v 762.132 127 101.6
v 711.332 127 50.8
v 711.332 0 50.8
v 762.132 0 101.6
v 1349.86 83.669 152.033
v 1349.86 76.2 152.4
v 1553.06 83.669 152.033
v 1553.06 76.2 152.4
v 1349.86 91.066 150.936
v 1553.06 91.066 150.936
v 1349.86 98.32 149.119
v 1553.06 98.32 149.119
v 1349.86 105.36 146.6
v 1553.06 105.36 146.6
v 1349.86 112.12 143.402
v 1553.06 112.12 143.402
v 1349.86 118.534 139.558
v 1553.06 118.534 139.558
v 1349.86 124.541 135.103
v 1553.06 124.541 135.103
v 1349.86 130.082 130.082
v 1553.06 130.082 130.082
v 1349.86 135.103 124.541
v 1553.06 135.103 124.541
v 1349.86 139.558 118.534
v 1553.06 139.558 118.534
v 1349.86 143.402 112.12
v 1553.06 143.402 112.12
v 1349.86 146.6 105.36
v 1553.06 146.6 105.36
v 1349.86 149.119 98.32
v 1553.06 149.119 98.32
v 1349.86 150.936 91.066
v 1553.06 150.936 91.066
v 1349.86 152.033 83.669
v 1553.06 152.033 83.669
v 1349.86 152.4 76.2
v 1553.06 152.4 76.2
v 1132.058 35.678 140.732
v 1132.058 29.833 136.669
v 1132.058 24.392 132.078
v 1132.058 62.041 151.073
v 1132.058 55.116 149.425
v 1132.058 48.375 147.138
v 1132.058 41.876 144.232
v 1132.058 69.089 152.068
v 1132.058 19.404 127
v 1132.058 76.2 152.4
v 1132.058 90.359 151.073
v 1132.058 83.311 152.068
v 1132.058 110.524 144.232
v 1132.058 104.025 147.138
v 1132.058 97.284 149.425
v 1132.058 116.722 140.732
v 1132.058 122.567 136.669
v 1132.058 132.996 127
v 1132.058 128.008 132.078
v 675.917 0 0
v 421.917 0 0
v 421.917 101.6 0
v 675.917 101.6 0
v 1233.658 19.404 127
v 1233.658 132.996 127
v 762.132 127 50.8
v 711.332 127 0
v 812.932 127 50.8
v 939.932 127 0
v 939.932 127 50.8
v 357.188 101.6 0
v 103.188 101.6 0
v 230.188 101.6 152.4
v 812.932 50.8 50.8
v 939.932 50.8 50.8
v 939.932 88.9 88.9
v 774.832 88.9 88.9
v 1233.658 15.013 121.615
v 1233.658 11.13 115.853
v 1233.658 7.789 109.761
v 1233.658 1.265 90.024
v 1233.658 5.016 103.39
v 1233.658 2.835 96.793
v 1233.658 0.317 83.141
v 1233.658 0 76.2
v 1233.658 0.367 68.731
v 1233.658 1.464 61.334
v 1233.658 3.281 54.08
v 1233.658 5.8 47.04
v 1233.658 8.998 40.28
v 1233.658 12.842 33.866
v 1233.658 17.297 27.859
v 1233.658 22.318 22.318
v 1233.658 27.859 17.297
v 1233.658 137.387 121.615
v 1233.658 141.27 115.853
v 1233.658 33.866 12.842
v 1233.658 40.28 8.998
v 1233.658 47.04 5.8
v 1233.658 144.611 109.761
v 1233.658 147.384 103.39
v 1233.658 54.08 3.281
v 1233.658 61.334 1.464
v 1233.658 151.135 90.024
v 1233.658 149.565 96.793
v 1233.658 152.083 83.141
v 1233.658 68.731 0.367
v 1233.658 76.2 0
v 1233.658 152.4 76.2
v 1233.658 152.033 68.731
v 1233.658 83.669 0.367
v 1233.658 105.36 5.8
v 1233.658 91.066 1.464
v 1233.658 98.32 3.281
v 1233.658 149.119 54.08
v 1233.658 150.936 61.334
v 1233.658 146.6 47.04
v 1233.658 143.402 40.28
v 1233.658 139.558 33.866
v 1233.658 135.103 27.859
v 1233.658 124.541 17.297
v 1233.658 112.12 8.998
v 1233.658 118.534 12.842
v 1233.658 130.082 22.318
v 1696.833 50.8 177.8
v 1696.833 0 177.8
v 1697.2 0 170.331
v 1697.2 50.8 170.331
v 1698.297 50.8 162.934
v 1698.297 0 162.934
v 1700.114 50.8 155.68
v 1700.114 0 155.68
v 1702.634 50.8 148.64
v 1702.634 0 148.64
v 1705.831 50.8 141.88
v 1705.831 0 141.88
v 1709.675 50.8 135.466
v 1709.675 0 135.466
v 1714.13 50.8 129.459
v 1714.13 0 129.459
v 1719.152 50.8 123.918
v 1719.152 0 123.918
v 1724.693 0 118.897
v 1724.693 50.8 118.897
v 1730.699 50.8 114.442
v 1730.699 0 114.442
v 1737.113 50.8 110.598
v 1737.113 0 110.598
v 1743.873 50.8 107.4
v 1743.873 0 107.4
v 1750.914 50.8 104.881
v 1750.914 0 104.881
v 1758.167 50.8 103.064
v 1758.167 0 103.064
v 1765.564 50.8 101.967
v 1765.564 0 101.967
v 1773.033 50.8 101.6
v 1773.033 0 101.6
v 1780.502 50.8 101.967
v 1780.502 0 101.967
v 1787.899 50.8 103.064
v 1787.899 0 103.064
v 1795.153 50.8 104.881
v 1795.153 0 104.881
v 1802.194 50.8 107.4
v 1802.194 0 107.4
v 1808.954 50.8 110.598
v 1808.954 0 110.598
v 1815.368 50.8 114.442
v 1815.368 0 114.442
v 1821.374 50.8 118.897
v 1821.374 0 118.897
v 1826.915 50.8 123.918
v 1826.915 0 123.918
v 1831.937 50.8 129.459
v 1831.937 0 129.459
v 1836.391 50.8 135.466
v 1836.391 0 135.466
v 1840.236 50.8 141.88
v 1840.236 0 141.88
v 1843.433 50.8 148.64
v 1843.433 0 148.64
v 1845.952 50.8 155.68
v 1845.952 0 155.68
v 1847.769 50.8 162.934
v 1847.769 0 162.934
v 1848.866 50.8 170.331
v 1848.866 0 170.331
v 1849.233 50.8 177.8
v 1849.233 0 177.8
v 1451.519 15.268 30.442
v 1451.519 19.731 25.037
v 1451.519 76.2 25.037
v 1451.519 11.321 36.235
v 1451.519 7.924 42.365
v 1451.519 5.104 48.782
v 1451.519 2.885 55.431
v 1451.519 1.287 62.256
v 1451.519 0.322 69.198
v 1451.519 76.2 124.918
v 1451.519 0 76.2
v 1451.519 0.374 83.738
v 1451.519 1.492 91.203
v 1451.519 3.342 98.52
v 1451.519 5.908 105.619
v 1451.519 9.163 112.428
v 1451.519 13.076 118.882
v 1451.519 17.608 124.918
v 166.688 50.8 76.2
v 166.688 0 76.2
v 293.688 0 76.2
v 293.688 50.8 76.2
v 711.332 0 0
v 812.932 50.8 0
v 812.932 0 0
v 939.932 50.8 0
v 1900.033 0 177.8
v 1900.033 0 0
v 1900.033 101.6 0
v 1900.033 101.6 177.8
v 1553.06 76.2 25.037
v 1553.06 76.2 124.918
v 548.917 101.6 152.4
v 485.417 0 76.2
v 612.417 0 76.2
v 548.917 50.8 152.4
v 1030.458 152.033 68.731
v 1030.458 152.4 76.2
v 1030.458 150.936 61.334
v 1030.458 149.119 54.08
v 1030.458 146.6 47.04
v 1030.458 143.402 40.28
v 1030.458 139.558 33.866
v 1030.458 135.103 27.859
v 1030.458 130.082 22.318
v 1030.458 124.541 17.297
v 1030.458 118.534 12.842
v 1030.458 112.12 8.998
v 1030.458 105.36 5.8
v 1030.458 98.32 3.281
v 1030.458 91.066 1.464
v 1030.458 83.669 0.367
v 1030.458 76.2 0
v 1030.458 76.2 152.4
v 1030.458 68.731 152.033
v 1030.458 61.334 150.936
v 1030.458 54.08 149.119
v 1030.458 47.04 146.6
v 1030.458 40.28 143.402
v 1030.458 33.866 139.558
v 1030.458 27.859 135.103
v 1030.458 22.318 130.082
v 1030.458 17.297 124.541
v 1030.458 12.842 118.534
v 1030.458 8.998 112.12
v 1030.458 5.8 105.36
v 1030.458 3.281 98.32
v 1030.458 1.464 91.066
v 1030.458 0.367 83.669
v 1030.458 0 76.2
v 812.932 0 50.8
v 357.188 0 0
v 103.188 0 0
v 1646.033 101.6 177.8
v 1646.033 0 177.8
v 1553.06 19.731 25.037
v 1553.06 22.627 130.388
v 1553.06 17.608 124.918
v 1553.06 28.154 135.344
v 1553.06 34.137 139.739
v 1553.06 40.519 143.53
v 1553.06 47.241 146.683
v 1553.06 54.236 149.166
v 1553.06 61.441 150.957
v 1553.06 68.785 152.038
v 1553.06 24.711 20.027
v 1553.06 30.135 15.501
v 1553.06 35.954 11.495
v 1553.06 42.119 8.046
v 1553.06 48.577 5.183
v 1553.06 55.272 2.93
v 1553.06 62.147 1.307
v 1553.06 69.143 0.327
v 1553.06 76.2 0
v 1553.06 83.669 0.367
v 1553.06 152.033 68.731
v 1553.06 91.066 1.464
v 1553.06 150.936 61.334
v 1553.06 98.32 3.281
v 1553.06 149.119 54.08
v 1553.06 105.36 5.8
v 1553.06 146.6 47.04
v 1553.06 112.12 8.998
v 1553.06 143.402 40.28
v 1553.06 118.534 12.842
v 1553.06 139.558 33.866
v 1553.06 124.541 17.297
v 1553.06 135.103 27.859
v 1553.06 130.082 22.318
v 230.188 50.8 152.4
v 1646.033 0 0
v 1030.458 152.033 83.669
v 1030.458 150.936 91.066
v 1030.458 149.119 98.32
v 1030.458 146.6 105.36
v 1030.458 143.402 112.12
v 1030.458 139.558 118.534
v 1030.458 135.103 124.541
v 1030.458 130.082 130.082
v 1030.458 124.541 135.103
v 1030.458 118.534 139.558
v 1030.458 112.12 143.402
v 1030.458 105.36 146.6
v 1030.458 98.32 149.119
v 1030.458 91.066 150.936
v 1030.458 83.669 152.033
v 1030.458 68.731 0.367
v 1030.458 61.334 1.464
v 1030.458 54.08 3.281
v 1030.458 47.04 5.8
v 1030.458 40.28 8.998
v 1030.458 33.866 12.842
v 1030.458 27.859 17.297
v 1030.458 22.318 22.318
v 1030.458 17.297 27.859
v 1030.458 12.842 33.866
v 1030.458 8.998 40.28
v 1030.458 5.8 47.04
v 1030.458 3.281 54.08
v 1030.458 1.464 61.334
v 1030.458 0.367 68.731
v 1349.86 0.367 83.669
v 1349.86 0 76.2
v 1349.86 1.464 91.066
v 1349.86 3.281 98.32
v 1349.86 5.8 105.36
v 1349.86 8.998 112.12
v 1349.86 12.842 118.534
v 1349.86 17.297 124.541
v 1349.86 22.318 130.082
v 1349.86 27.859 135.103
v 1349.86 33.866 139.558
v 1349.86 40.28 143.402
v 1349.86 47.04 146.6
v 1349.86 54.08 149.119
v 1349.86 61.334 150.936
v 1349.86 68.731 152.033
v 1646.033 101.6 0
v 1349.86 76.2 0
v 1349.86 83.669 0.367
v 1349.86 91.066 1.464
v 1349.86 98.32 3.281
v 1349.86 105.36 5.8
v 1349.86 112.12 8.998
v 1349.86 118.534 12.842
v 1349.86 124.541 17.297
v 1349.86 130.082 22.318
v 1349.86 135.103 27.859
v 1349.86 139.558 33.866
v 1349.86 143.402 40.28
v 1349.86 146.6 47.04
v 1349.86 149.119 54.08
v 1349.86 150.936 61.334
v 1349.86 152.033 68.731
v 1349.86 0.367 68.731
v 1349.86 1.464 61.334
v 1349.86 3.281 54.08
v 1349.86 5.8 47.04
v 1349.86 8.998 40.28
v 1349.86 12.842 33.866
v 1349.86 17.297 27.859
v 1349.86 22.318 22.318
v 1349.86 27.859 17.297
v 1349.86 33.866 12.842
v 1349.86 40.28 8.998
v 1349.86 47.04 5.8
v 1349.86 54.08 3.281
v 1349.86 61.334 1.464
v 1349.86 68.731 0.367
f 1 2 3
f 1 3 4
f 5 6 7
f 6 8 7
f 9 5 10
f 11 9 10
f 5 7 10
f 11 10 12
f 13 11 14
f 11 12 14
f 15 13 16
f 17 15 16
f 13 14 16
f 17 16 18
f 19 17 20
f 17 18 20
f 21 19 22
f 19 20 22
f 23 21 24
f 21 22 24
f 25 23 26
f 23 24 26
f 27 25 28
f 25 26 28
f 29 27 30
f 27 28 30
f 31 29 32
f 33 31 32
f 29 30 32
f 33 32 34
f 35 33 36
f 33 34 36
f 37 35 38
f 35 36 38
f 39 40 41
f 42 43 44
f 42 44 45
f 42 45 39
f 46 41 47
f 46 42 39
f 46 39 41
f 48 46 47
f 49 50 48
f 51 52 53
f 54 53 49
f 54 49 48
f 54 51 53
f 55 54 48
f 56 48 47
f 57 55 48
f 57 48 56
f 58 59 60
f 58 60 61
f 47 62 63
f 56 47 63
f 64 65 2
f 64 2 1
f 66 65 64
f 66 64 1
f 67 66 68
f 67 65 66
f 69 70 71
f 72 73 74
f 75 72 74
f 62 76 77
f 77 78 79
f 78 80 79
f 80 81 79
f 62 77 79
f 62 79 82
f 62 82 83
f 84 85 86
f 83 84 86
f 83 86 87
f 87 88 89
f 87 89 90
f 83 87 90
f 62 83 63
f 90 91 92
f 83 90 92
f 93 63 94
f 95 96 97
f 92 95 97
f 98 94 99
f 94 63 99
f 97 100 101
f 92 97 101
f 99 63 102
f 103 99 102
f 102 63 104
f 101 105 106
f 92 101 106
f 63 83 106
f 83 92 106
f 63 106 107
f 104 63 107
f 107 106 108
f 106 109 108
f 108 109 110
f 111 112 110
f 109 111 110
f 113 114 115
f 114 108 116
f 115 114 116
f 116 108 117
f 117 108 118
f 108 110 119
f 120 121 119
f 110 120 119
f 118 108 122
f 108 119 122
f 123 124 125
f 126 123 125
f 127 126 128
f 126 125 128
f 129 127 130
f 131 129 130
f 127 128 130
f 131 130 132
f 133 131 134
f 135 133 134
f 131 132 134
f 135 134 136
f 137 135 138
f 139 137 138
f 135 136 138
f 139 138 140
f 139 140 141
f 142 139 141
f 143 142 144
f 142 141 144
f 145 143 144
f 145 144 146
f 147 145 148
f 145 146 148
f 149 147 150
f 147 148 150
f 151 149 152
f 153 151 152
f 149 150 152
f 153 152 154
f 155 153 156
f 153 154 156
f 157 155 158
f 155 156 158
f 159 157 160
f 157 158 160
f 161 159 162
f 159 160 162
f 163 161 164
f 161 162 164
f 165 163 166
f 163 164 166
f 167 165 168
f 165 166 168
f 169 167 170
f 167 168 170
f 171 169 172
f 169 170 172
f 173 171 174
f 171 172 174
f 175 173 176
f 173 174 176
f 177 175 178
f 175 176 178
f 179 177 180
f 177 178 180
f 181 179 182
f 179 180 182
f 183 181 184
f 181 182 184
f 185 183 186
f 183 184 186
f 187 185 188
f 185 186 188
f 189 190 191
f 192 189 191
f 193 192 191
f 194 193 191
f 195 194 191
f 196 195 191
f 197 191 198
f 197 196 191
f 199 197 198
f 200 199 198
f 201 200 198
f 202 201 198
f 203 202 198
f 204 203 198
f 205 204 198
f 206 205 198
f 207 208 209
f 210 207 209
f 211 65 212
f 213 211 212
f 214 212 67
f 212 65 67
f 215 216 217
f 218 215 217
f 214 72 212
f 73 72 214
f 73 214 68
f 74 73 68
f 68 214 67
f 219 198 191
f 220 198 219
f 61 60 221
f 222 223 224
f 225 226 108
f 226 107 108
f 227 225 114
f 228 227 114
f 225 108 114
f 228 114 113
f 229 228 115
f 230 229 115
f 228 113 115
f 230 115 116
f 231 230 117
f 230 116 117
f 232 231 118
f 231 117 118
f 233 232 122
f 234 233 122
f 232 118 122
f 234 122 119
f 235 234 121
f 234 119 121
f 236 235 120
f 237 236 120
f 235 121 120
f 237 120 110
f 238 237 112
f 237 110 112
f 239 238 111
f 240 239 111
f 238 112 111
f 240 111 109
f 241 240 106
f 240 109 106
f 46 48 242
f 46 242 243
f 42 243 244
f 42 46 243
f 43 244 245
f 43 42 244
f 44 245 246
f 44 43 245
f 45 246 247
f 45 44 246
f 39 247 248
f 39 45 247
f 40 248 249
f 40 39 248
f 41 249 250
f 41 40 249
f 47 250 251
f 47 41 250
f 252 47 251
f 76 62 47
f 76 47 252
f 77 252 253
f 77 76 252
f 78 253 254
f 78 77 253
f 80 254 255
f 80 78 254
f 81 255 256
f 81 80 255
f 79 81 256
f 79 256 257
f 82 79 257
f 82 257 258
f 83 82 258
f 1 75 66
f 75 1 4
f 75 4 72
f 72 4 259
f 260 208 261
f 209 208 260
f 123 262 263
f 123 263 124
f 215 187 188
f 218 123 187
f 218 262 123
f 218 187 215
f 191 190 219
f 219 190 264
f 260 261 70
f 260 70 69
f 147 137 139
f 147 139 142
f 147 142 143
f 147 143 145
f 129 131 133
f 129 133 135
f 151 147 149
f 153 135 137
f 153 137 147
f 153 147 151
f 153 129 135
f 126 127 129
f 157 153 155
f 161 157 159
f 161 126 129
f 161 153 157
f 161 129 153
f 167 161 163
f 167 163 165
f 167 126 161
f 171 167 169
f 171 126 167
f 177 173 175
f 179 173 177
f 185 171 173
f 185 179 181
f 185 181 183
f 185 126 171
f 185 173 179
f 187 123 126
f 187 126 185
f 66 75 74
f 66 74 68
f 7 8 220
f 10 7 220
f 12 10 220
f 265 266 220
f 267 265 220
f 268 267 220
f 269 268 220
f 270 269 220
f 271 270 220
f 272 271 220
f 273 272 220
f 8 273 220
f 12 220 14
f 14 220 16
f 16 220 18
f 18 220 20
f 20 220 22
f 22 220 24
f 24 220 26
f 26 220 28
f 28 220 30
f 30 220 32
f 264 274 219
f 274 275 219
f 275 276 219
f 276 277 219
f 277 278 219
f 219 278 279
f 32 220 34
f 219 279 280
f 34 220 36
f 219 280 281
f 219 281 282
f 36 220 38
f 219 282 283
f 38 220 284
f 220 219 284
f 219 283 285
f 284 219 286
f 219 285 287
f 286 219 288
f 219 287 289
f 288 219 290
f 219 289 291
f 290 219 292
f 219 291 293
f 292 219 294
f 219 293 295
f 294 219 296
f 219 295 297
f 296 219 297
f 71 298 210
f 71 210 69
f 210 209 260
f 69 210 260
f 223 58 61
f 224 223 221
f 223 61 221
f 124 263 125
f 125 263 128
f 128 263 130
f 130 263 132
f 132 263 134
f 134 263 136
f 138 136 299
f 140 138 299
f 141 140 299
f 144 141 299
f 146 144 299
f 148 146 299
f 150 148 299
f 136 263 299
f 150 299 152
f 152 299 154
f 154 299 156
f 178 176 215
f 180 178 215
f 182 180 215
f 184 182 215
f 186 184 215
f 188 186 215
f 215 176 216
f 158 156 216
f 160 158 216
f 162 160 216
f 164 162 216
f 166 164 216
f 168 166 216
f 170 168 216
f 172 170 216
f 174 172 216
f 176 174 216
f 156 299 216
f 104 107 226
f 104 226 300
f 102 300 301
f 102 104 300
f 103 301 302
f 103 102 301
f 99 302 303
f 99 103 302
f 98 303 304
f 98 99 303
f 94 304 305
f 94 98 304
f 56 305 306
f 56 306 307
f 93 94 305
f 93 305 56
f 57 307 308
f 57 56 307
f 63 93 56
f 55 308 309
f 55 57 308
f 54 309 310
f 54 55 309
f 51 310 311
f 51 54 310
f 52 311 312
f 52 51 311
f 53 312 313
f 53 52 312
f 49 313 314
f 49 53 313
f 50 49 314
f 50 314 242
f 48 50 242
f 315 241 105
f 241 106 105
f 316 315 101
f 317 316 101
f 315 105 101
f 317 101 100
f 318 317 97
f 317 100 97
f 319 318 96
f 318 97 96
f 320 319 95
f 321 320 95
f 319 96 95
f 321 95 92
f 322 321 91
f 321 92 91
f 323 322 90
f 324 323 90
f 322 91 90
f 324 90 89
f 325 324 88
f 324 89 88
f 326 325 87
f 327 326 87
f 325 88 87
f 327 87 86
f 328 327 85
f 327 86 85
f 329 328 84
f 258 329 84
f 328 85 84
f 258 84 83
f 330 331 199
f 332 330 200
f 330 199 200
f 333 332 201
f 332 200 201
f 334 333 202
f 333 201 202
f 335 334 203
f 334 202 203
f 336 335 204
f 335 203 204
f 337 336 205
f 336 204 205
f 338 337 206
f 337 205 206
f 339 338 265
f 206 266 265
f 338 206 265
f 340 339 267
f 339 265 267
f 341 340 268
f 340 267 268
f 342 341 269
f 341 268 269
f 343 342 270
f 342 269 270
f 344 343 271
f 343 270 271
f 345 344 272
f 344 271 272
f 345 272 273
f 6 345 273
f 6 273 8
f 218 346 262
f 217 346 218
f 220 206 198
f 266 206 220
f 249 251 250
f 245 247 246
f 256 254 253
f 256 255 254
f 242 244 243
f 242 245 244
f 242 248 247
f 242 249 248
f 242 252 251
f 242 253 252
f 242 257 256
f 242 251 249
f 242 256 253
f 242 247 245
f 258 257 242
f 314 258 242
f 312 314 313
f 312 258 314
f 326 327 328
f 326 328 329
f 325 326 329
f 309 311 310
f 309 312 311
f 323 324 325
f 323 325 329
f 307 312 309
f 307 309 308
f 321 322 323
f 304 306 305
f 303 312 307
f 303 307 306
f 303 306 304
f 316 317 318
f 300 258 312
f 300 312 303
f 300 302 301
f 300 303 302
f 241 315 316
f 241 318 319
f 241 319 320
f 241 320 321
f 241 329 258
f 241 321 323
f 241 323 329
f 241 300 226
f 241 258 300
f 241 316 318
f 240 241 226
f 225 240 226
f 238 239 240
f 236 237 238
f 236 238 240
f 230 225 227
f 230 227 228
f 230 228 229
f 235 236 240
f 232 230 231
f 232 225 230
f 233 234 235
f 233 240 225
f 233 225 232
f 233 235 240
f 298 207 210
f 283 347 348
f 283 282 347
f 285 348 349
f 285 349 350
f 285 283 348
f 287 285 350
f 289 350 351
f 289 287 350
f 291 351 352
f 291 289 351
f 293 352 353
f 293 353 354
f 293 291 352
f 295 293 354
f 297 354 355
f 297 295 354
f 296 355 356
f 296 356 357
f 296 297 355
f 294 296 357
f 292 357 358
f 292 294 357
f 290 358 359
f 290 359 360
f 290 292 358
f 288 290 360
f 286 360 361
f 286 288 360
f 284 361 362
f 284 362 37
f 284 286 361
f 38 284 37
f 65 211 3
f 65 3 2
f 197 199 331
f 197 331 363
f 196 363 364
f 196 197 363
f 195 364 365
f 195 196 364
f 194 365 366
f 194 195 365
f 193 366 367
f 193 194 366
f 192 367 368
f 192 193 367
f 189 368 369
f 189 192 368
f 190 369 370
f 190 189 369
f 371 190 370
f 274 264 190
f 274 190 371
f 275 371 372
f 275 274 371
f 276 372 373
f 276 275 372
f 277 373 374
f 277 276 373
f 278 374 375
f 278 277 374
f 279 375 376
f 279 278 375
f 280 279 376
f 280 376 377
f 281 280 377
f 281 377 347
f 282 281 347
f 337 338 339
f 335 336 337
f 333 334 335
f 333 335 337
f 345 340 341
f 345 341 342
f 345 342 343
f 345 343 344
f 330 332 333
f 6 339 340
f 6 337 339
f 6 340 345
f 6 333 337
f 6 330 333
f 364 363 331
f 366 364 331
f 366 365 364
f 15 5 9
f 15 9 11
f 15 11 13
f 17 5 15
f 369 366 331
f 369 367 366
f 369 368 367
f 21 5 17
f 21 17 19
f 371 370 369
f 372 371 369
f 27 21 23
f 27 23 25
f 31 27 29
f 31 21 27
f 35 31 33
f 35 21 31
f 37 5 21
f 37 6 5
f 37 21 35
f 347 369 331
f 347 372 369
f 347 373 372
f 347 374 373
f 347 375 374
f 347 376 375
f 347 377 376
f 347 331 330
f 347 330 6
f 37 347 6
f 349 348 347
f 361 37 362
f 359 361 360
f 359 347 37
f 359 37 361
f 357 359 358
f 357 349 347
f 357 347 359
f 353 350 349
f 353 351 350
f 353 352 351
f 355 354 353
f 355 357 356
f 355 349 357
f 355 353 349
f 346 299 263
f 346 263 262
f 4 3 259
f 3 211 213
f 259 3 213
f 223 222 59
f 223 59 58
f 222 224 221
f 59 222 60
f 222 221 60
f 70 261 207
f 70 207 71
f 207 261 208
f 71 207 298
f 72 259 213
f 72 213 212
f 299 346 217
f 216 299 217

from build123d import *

# Parameters (mm, degrees)
F0_W      = 254
F0_H      = 152.4
F1_DEPTH  = 101.6
F3_DEPTH  = 171.45
F5_DEPTH  = 50.8
F7_DEPTH  = 181.102
F8_W      = 254
F8_H      = 152.4
F9_DEPTH  = 101.6
F11_DEPTH = 317.754
F13_DEPTH = 144.78
F15_DEPTH = 111.76
F16_W     = 228.6
F16_H     = 127
F17_DEPTH = 101.6
F18_W     = 127
F18_H     = 50.8
F19_DEPTH = 124.46
F20_W     = 76.2
F20_H     = 12.7
F21_DEPTH = 127
F23_DEPTH = 210.82
F25_DEPTH = 127
F27_DEPTH = 127
F29_DEPTH = 157.48
F31_DEPTH = 177.8
F32_W     = 203.2
F32_H     = 152.4
F33_DEPTH = 152.4
F34_W     = 152.4
F34_H     = 25.4
F35_DEPTH = 101.6
F36_R     = 76.2
F37_R     = 76.19999
F38_R     = 76.19999
F39_R     = 76.2
F40_W     = 203.2
F40_H     = 152.4
F41_DEPTH = 152.4
F42_W     = 101.5413056934
F42_H     = 99.8808480799
F43_DEPTH = 76.2
F44_R     = 76.2
F45_R     = 76.19999
F46_W     = 254
F46_H     = 101.6
F47_DEPTH = 177.8
F49_DEPTH = 50.8


# Not quite as in the source:
# - a fillet or chamfer is up to 0.001 mm smaller than in the source, because OpenCascade refuses the exact size


with BuildPart() as f1:
    # F0 (on Front) → F1 (new body)
    with BuildSketch(Plane.XZ):
        with Locations((230.1876775126, 76.2)):
            Rectangle(F0_W, F0_H)
    extrude(amount=-F1_DEPTH)

    # F2 (on face) → F3 (cut)
    with BuildSketch(Plane.XZ):
        Polygon((103.1876775126, 152.4), (103.1876775126, 0), (166.6876775126, 76.2), (230.1876775126, 152.4), align=None)
    extrude(amount=-F3_DEPTH, mode=Mode.SUBTRACT)

    # F4 (on face) → F5 (cut)
    with BuildSketch(Plane.XZ):
        Polygon((166.6876775126, 76.2), (293.6876775126, 76.2), (230.1876775126, 152.4), align=None)
    extrude(amount=-F5_DEPTH, mode=Mode.SUBTRACT)

    # F6 (on face) → F7 (cut)
    with BuildSketch(Plane.XZ):
        Polygon((230.1876775126, 152.4), (293.6876775126, 76.2), (357.1876775126, 0), (357.1876775126, 152.4), align=None)
    extrude(amount=-F7_DEPTH, mode=Mode.SUBTRACT)


with BuildPart() as f9:
    # F8 (on Front) → F9 (new body)
    with BuildSketch(Plane.XZ):
        with Locations((548.9165070272, 76.2)):
            Rectangle(F8_W, F8_H)
    extrude(amount=-F9_DEPTH)

    # F10 (on face) → F11 (cut)
    with BuildSketch(Plane.YZ.offset(675.9165070272)):
        Polygon((0, 152.4), (0, 76.2), (50.8, 152.4), align=None)
    extrude(amount=-F11_DEPTH, mode=Mode.SUBTRACT)

    # F12 (on face) → F13 (cut)
    with BuildSketch(Plane(origin=(0, 101.6, 0), x_dir=(-1, 0, 0), z_dir=(0, 1, 0))):
        Polygon((-675.9165070272, 152.4), (-675.9165070272, 0), (-548.9165070272, 152.4), align=None)
    extrude(amount=-F13_DEPTH, mode=Mode.SUBTRACT)

    # F14 (on face) → F15 (cut)
    with BuildSketch(Plane(origin=(0, 101.6, 0), x_dir=(-1, 0, 0), z_dir=(0, 1, 0))):
        Polygon((-421.9165070272, 152.4), (-548.9165070272, 152.4), (-421.9165070272, 0), align=None)
    extrude(amount=-F15_DEPTH, mode=Mode.SUBTRACT)


with BuildPart() as f17:
    # F16 (on Top) → F17 (new body)
    with BuildSketch(Plane.XY):
        with Locations((825.6324577618, 63.5)):
            Rectangle(F16_W, F16_H)
    extrude(amount=F17_DEPTH)

    # F18 (on face) → F19 (cut)
    with BuildSketch(Plane.XY.offset(101.6)):
        with Locations((876.4324577618, 25.4)):
            Rectangle(F18_W, F18_H)
    extrude(amount=-F19_DEPTH, mode=Mode.SUBTRACT)

    # F20 (on face) → F21 (cut)
    with BuildSketch(Plane.YZ.offset(939.9324577618)):
        with Locations((88.9, 95.25)):
            Rectangle(F20_W, F20_H)
    extrude(amount=-F21_DEPTH, mode=Mode.SUBTRACT)

    # F22 (on face) → F23 (cut)
    with BuildSketch(Plane.XZ):
        Polygon((711.3324577618, 50.8), (762.1324577618, 101.6), (711.3324577618, 101.6), align=None)
    extrude(amount=-F23_DEPTH, mode=Mode.SUBTRACT)

    # F24 (on face) → F25 (cut)
    with BuildSketch(Plane.YZ.offset(939.9324577618)):
        Polygon((88.9, 88.9), (127, 50.8), (127, 88.9), align=None)
    extrude(amount=-F25_DEPTH, mode=Mode.SUBTRACT)

    # F26 (on face) → F27 (cut)
    with BuildSketch(Plane.YZ.offset(939.9324577618)):
        Polygon((50.8, 88.9), (50.8, 50.8), (88.9, 88.9), align=None)
    extrude(amount=-F27_DEPTH, mode=Mode.SUBTRACT)

    # F28 (on face) → F29 (cut)
    with BuildSketch(Plane.XZ):
        Polygon((762.1324577618, 101.6), (812.9324577618, 50.8), (812.9324577618, 101.6), align=None)
    extrude(amount=-F29_DEPTH, mode=Mode.SUBTRACT)

    # F30 (on face) → F31 (join)
    with BuildSketch(Plane.YZ.offset(939.9324577618)):
        Polygon((88.9, 88.9), (50.8, 50.8), (127, 50.8), align=None)
    extrude(amount=-F31_DEPTH)


with BuildPart() as f33:
    # F32 (on Top) → F33 (new body)
    with BuildSketch(Plane.XY):
        with Locations((1132.0576660588, 76.2)):
            Rectangle(F32_W, F32_H)
    extrude(amount=F33_DEPTH)

    # F34 (on face) → F35 (cut)
    with BuildSketch(Plane.YZ.offset(1233.6576660588)):
        with Locations((76.2, 139.7)):
            Rectangle(F34_W, F34_H)
    extrude(amount=-F35_DEPTH, mode=Mode.SUBTRACT)

    # F36
    f36_edges = [f33.edges().sort_by_distance(p)[0] for p in [
        (1081.257666, 152.4, 152.4),
    ]]
    fillet(f36_edges, radius=F36_R)

    # F37 (radius 76.2 in the source; OpenCascade refuses exactly that, so slightly less here)
    f37_edges = [f33.edges().sort_by_distance(p)[0] for p in [
        (1081.257666, 0, 152.4),
    ]]
    fillet(f37_edges, radius=F37_R)

    # F38 (radius 76.2 in the source; OpenCascade refuses exactly that, so slightly less here)
    f38_edges = [f33.edges().sort_by_distance(p)[0] for p in [
        (1132.057666, 152.4, 0),
    ]]
    fillet(f38_edges, radius=F38_R)

    # F39
    f39_edges = [f33.edges().sort_by_distance(p)[0] for p in [
        (1132.057666, 0, 0),
    ]]
    fillet(f39_edges, radius=F39_R)


with BuildPart() as f41:
    # F40 (on Top) → F41 (new body)
    with BuildSketch(Plane.XY):
        with Locations((1451.4601989353, 76.2)):
            Rectangle(F40_W, F40_H)
    extrude(amount=F41_DEPTH)

    # F42 (on face) → F43 (cut)
    with BuildSketch(Plane.XZ):
        with Locations((1502.2895460886, 74.9775152653)):
            Rectangle(F42_W, F42_H)
    extrude(amount=-F43_DEPTH, mode=Mode.SUBTRACT)

    # F44
    f44_edges = [f41.edges().sort_by_distance(p)[0] for p in [
        (1451.460199, 0, 152.4),
    ]]
    fillet(f44_edges, radius=F44_R)

    # F45 (radius 76.2 in the source; OpenCascade refuses exactly that, so slightly less here)
    f45_edges = [f41.edges().sort_by_distance(p)[0] for p in [
        (1451.460199, 0, 0),
        (1451.460199, 152.4, 152.4),
        (1451.460199, 152.4, 0),
    ]]
    fillet(f45_edges, radius=F45_R)


with BuildPart() as f47:
    # F46 (on Top) → F47 (new body)
    with BuildSketch(Plane.XY):
        with Locations((1773.0333075482, 50.8)):
            Rectangle(F46_W, F46_H)
    extrude(amount=F47_DEPTH)

    # F48 (on face) → F49 (cut)
    with BuildSketch(Plane.XZ):
        with BuildLine():
            ThreePointArc((1696.8333075482, 177.8), (1773.0333075482, 101.6), (1849.2333075482, 177.8))
            Line((1849.2333075482, 177.8), (1696.8333075482, 177.8))
        make_face()
    extrude(amount=-F49_DEPTH, mode=Mode.SUBTRACT)


solid = Compound([f1.part, f9.part, f17.part, f33.part, f41.part, f47.part])
